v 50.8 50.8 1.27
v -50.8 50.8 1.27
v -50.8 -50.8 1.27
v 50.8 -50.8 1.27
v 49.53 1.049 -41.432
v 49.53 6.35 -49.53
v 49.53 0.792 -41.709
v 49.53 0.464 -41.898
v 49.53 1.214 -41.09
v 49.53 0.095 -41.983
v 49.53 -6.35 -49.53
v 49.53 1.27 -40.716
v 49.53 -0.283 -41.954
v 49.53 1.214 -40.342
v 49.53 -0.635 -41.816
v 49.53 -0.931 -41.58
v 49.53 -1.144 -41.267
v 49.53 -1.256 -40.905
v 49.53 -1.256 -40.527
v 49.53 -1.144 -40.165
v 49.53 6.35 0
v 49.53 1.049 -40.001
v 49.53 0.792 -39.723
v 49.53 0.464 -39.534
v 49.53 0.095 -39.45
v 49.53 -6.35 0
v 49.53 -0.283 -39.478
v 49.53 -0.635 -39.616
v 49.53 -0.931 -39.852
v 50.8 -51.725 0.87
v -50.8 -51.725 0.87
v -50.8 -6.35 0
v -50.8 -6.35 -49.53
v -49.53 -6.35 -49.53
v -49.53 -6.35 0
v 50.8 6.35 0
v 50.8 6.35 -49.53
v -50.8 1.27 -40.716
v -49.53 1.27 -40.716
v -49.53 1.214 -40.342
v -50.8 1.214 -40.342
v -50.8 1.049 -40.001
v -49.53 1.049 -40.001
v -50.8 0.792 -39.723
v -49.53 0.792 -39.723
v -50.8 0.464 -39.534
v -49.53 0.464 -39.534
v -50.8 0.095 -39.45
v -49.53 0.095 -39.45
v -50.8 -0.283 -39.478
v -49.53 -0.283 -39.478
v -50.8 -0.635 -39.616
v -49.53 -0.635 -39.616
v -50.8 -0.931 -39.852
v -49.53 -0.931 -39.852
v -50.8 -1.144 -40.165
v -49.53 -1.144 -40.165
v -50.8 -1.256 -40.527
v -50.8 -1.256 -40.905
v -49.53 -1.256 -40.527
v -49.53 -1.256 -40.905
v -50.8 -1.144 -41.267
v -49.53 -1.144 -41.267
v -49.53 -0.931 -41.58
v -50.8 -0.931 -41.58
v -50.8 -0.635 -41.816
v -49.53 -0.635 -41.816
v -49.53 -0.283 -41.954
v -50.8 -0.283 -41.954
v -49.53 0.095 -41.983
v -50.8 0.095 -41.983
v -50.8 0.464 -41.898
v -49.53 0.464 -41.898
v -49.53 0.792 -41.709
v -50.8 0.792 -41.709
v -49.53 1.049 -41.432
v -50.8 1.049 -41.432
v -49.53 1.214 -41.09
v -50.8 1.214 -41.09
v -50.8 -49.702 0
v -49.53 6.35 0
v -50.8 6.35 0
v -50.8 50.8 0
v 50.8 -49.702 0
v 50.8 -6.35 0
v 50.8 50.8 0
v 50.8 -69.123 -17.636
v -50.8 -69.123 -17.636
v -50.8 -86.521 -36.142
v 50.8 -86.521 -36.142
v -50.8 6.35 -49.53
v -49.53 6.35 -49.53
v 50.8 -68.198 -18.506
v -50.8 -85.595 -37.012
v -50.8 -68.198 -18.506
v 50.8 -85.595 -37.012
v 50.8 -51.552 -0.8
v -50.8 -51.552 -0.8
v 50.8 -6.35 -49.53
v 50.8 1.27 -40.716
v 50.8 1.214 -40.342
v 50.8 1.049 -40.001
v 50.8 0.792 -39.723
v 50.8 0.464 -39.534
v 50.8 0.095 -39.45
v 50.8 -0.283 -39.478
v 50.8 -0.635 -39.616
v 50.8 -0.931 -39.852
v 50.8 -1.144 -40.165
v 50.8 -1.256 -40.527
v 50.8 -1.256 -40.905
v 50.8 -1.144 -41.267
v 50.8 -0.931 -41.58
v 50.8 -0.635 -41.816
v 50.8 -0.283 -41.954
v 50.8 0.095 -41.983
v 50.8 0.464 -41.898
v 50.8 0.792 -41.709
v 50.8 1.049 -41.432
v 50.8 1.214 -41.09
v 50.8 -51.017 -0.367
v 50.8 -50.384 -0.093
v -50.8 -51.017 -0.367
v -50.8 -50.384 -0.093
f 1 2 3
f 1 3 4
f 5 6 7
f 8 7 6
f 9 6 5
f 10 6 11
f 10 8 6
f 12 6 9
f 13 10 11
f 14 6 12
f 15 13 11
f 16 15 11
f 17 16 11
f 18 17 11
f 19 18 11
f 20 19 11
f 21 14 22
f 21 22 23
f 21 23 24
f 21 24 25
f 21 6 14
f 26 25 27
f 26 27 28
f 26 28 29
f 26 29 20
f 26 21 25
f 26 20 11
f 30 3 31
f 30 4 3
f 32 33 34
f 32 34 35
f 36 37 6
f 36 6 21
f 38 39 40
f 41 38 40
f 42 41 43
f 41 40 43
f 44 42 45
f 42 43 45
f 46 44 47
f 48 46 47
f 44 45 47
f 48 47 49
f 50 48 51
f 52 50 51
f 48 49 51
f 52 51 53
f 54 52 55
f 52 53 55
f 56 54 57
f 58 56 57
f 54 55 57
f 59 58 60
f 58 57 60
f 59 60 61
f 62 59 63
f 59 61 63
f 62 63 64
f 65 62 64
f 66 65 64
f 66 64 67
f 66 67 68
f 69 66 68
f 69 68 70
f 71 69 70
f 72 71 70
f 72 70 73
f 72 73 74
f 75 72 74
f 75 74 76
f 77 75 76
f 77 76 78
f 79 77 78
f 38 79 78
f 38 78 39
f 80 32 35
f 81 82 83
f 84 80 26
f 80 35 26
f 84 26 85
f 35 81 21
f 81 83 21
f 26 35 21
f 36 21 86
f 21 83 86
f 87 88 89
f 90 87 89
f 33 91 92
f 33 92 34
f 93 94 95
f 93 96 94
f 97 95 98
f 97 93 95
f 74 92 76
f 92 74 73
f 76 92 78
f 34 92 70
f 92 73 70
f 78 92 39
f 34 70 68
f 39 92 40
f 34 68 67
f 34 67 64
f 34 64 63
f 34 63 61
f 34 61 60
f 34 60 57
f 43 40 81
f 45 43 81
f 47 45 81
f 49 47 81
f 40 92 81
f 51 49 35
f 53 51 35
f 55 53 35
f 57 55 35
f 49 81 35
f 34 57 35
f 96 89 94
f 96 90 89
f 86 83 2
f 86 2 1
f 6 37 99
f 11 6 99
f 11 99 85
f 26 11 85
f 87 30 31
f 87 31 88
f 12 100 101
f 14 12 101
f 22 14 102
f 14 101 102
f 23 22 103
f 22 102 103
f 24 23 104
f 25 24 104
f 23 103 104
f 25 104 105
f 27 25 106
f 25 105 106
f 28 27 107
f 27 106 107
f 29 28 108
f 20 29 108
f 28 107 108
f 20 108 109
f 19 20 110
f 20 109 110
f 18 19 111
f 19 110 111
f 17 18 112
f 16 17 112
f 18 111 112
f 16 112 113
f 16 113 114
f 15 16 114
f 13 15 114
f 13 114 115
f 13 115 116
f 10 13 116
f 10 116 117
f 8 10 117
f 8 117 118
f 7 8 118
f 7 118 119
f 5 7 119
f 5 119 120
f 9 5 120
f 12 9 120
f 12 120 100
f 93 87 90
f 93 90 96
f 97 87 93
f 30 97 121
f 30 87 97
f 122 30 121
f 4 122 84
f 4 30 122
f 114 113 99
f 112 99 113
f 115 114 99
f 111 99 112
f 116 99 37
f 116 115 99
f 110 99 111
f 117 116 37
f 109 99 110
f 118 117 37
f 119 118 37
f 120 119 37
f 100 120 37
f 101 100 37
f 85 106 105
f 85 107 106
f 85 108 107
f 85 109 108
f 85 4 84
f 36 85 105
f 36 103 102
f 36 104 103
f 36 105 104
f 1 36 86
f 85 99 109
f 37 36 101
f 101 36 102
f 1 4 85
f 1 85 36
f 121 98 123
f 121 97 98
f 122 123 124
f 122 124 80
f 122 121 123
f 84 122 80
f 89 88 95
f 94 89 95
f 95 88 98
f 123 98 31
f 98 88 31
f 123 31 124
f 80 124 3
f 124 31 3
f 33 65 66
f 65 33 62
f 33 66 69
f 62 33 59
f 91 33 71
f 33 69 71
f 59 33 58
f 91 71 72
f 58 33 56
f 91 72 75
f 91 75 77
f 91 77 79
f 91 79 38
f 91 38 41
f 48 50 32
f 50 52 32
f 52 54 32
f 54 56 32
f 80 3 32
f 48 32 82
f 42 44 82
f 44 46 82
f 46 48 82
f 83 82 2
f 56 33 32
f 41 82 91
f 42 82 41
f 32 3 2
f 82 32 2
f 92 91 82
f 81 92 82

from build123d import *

# Parameters (mm, degrees)
F0_W          = 101.6
F0_H          = 101.6
F1_DEPTH      = 1.27
F3_DEPTH      = 50.8
F3_DEPTH_BACK = 50.8
F4_W          = 12.7
F4_H          = 49.53
F5_DEPTH      = 1.27
F8_D          = 2.54
F9_R          = 2.54


with BuildPart() as f1:
    # F0 (on Top) → F1 (new body)
    with BuildSketch(Plane.XY):
        Rectangle(F0_W, F0_H)
    extrude(amount=F1_DEPTH)

    # F2 (on Right) → F3 (join, two sides)
    with BuildSketch(Plane.YZ) as f3_sk:
        Polygon((-68.1977470568, -18.5061718718), (-50.8, 0), (-51.7253085936, 0.8698873528), (-69.1230556503, -17.636284519), align=None)
        Polygon((-85.5954941135, -37.0123437436), (-68.1977470568, -18.5061718718), (-69.1230556503, -17.636284519), (-86.5208027071, -36.1424563908), align=None)
        Polygon((-51.7253085936, 0.8698873528), (-50.8, 0), (-50.8, 1.27), align=None)
    extrude(amount=F3_DEPTH)
    extrude(f3_sk.sketch, amount=-F3_DEPTH_BACK)

    # F4 (on face) → F5 (join)
    with BuildSketch(Plane(origin=(-50.8, 0, 0), x_dir=(0, -1, 0), z_dir=(-1, 0, 0))):
        with Locations((0, -24.765)):
            Rectangle(F4_W, F4_H)
    extrude(amount=-F5_DEPTH)

    # F6: F1 across plane


with BuildPart() as f1_1:
    add(f1.part)
    add(f1.part.mirror(Plane.YZ))

    # F8 (through all)
    with Locations(Plane(origin=(-50.8, 0, 0), x_dir=(0, -1, 0), z_dir=(-1, 0, 0))):
        with Locations((0, -40.7161329025)):
            Hole(F8_D / 2)

    # F9
    f9_edges = [f1_1.edges().sort_by_distance(p)[0] for p in [
        (0, -50.8, 0),
    ]]
    fillet(f9_edges, radius=F9_R)


solid = f1_1.part
